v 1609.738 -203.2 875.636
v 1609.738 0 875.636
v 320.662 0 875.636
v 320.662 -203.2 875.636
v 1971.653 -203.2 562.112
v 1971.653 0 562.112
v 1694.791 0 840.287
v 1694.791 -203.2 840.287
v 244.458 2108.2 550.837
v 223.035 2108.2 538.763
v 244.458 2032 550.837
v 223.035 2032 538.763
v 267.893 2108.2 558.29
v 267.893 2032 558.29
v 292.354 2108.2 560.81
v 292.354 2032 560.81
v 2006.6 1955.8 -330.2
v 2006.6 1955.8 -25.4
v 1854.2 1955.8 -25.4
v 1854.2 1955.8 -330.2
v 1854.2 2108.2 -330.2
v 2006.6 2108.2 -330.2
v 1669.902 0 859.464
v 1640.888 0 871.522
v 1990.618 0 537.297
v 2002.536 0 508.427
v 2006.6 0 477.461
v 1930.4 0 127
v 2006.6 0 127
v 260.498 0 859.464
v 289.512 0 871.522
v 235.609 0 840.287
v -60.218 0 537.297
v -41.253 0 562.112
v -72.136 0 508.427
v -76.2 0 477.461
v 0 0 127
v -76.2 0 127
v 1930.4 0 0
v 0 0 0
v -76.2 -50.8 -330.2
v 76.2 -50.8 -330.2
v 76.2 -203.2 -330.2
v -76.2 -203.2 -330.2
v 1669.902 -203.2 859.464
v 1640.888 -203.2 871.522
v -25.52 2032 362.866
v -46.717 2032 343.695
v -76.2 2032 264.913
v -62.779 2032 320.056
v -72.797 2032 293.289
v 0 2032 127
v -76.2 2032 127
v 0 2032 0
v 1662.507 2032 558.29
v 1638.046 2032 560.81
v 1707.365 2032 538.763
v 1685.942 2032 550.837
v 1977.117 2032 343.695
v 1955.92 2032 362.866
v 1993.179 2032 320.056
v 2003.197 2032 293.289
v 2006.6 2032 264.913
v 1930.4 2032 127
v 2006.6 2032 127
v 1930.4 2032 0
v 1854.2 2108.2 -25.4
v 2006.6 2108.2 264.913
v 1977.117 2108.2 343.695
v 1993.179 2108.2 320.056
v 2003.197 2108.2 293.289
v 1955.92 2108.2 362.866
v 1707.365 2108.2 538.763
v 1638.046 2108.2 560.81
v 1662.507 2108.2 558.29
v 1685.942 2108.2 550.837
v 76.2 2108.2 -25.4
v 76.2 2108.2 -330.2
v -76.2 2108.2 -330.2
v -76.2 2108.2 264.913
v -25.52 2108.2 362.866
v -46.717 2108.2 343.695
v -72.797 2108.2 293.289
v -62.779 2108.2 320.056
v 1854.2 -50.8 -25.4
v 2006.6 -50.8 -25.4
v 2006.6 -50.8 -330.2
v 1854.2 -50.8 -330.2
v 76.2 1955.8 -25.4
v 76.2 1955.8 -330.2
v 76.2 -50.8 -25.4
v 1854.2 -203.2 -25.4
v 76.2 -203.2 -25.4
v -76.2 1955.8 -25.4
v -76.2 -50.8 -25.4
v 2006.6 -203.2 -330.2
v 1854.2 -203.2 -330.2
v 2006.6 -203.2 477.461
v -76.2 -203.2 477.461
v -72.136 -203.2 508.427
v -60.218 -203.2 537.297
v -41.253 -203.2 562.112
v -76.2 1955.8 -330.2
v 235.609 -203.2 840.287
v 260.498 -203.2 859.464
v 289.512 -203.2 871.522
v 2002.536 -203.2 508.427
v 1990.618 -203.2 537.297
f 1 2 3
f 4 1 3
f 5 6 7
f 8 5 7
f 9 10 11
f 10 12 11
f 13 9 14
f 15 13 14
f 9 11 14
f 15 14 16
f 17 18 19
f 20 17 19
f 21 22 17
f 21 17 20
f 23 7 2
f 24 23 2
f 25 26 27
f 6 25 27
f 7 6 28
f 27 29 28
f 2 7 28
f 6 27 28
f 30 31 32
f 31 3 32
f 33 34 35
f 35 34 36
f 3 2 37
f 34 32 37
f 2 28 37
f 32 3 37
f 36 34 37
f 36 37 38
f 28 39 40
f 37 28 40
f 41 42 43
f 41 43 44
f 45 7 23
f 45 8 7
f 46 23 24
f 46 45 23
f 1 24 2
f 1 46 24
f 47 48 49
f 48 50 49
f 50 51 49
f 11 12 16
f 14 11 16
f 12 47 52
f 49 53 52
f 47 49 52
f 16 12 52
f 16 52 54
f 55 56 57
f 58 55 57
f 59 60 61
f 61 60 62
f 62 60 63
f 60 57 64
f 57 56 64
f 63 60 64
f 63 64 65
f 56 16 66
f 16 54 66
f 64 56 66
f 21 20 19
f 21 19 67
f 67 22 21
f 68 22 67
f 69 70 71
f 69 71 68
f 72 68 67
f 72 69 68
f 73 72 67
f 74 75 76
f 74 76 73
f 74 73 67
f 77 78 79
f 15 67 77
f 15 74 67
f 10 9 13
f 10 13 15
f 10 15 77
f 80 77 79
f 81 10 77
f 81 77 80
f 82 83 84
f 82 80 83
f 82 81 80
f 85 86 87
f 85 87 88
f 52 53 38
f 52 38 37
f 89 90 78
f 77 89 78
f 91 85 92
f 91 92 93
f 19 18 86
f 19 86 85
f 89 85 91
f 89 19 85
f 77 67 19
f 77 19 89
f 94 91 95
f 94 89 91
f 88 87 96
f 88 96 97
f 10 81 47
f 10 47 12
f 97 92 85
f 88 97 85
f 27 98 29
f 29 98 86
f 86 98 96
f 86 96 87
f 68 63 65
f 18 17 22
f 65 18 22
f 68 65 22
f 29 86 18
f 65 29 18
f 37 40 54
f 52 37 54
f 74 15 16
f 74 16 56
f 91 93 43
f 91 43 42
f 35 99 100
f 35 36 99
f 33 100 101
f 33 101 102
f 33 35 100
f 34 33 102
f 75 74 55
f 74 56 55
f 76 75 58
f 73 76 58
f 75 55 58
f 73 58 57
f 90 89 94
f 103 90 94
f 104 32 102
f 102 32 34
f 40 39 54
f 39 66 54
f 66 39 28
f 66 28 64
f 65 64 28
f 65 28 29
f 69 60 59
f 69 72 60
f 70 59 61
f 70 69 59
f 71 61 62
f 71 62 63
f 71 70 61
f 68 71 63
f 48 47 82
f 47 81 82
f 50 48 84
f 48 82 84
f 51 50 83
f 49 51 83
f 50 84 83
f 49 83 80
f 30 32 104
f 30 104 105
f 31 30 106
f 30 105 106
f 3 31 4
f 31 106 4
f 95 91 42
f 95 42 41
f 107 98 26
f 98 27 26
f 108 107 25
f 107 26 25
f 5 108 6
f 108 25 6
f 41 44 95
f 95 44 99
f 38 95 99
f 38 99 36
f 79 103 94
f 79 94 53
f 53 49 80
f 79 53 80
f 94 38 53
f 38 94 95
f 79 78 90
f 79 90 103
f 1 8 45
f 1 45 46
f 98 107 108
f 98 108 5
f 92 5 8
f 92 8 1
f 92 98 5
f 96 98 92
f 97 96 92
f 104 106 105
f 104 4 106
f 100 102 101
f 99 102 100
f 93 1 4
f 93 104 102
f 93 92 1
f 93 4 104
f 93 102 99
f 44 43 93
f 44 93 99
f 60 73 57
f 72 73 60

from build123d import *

# Parameters (mm, degrees)
SKETCH1_W           = 2082.8
SKETCH1_H           = 127
SKETCH1_H_2         = 2184.4
SKETCH1_W_2         = 1930.4
SKETCH1_H_3         = 2032
BOSS_EXTRUDE1_DEPTH = 127
BOSS_EXTRUDE2_DEPTH = 25.4
SKETCH3_W           = 2082.8
SKETCH3_H           = 203.2
BOSS_EXTRUDE3_DEPTH = 400
SKETCH4_W           = 2082.8
SKETCH4_H           = 76.2
BOSS_EXTRUDE4_DEPTH = 200
BOSS_EXTRUDE5_DEPTH = 203.2
BOSS_EXTRUDE6_DEPTH = 76.2
FILLET1_R           = 120
SKETCH7_W           = 152.4
SKETCH7_H           = 152.4
BOSS_EXTRUDE7_DEPTH = 304.8


with BuildPart() as part:
    # Sketch1 → Boss-Extrude1 (new body)
    with BuildSketch(Plane.XY):
        with Locations((965.2, -139.7)):
            Rectangle(SKETCH1_W, SKETCH1_H)
        with Locations((965.2, 1016)):
            Rectangle(SKETCH1_W, SKETCH1_H_2)
        with Locations((965.2, 1016)):
            Rectangle(SKETCH1_W_2, SKETCH1_H_3, mode=Mode.SUBTRACT)
    extrude(amount=BOSS_EXTRUDE1_DEPTH)

    # Sketch2 → Boss-Extrude2 (add)
    with BuildSketch(Plane(origin=(0, 0, 0), x_dir=(-1, 0, 0), z_dir=(0, 0, -1))):
        Polygon((76.2, 2108.2), (-2006.6, 2108.2), (-2006.6, -76.2), (-2006.6, -203.2), (76.2, -203.2), (76.2, -76.2), align=None)
    extrude(amount=BOSS_EXTRUDE2_DEPTH)

    # Sketch3 → Boss-Extrude3 (add)
    with BuildSketch(Plane.XY.offset(127)):
        with Locations((965.2, -101.6)):
            Rectangle(SKETCH3_W, SKETCH3_H)
    extrude(amount=BOSS_EXTRUDE3_DEPTH)

    # Sketch4 → Boss-Extrude4 (add)
    with BuildSketch(Plane.XY.offset(127)):
        with Locations((965.2, 2070.1)):
            Rectangle(SKETCH4_W, SKETCH4_H)
    extrude(amount=BOSS_EXTRUDE4_DEPTH)

    # Sketch5 → Boss-Extrude5 (add)
    with BuildSketch(Plane(origin=(0, 0, 0), x_dir=(1, 0, 0), z_dir=(0, 1, 0))):
        Polygon((2006.6, -527), (1659.609999688, -875.635603884), (270.790000312, -875.635603884), (-76.2, -527), align=None)
    extrude(amount=-BOSS_EXTRUDE5_DEPTH)

    # Sketch6 → Boss-Extrude6 (add)
    with BuildSketch(Plane(origin=(0, 2108.2, 0), x_dir=(1, 0, 0), z_dir=(0, 1, 0))):
        Polygon((965.2, -560.809930934), (965.2, -327), (-76.2, -327), (254.18871256, -560.809930934), align=None)
        Polygon((2006.6, -327), (965.2, -327), (965.2, -560.809930934), (1676.21128744, -560.809930934), align=None)
    extrude(amount=-BOSS_EXTRUDE6_DEPTH)

    # Fillet1
    fillet1_edges = [part.edges().sort_by_distance(p)[0] for p in [
        (2006.6, -101.6, 527),
        (-76.2, -101.6, 527),
        (-76.2, 2070.1, 327),
        (2006.6, 2070.1, 327),
        (270.790000312, -101.6, 875.635603884),
        (1659.609999688, -101.6, 875.635603884),
        (1676.21128744, 2070.1, 560.809930934),
        (254.18871256, 2070.1, 560.809930934),
    ]]
    fillet(fillet1_edges, radius=FILLET1_R)

    # Sketch7 → Boss-Extrude7 (add)
    with BuildSketch(Plane(origin=(0, 0, -25.4), x_dir=(-1, 0, 0), z_dir=(0, 0, -1))):
        with Locations((0, 2032)):
            Rectangle(SKETCH7_W, SKETCH7_H)
        with Locations((-1930.4, 2032)):
            Rectangle(SKETCH7_W, SKETCH7_H)
        with Locations((0, -127)):
            Rectangle(SKETCH7_W, SKETCH7_H)
        with Locations((-1930.4, -127)):
            Rectangle(SKETCH7_W, SKETCH7_H)
    extrude(amount=BOSS_EXTRUDE7_DEPTH)


solid = part.part
